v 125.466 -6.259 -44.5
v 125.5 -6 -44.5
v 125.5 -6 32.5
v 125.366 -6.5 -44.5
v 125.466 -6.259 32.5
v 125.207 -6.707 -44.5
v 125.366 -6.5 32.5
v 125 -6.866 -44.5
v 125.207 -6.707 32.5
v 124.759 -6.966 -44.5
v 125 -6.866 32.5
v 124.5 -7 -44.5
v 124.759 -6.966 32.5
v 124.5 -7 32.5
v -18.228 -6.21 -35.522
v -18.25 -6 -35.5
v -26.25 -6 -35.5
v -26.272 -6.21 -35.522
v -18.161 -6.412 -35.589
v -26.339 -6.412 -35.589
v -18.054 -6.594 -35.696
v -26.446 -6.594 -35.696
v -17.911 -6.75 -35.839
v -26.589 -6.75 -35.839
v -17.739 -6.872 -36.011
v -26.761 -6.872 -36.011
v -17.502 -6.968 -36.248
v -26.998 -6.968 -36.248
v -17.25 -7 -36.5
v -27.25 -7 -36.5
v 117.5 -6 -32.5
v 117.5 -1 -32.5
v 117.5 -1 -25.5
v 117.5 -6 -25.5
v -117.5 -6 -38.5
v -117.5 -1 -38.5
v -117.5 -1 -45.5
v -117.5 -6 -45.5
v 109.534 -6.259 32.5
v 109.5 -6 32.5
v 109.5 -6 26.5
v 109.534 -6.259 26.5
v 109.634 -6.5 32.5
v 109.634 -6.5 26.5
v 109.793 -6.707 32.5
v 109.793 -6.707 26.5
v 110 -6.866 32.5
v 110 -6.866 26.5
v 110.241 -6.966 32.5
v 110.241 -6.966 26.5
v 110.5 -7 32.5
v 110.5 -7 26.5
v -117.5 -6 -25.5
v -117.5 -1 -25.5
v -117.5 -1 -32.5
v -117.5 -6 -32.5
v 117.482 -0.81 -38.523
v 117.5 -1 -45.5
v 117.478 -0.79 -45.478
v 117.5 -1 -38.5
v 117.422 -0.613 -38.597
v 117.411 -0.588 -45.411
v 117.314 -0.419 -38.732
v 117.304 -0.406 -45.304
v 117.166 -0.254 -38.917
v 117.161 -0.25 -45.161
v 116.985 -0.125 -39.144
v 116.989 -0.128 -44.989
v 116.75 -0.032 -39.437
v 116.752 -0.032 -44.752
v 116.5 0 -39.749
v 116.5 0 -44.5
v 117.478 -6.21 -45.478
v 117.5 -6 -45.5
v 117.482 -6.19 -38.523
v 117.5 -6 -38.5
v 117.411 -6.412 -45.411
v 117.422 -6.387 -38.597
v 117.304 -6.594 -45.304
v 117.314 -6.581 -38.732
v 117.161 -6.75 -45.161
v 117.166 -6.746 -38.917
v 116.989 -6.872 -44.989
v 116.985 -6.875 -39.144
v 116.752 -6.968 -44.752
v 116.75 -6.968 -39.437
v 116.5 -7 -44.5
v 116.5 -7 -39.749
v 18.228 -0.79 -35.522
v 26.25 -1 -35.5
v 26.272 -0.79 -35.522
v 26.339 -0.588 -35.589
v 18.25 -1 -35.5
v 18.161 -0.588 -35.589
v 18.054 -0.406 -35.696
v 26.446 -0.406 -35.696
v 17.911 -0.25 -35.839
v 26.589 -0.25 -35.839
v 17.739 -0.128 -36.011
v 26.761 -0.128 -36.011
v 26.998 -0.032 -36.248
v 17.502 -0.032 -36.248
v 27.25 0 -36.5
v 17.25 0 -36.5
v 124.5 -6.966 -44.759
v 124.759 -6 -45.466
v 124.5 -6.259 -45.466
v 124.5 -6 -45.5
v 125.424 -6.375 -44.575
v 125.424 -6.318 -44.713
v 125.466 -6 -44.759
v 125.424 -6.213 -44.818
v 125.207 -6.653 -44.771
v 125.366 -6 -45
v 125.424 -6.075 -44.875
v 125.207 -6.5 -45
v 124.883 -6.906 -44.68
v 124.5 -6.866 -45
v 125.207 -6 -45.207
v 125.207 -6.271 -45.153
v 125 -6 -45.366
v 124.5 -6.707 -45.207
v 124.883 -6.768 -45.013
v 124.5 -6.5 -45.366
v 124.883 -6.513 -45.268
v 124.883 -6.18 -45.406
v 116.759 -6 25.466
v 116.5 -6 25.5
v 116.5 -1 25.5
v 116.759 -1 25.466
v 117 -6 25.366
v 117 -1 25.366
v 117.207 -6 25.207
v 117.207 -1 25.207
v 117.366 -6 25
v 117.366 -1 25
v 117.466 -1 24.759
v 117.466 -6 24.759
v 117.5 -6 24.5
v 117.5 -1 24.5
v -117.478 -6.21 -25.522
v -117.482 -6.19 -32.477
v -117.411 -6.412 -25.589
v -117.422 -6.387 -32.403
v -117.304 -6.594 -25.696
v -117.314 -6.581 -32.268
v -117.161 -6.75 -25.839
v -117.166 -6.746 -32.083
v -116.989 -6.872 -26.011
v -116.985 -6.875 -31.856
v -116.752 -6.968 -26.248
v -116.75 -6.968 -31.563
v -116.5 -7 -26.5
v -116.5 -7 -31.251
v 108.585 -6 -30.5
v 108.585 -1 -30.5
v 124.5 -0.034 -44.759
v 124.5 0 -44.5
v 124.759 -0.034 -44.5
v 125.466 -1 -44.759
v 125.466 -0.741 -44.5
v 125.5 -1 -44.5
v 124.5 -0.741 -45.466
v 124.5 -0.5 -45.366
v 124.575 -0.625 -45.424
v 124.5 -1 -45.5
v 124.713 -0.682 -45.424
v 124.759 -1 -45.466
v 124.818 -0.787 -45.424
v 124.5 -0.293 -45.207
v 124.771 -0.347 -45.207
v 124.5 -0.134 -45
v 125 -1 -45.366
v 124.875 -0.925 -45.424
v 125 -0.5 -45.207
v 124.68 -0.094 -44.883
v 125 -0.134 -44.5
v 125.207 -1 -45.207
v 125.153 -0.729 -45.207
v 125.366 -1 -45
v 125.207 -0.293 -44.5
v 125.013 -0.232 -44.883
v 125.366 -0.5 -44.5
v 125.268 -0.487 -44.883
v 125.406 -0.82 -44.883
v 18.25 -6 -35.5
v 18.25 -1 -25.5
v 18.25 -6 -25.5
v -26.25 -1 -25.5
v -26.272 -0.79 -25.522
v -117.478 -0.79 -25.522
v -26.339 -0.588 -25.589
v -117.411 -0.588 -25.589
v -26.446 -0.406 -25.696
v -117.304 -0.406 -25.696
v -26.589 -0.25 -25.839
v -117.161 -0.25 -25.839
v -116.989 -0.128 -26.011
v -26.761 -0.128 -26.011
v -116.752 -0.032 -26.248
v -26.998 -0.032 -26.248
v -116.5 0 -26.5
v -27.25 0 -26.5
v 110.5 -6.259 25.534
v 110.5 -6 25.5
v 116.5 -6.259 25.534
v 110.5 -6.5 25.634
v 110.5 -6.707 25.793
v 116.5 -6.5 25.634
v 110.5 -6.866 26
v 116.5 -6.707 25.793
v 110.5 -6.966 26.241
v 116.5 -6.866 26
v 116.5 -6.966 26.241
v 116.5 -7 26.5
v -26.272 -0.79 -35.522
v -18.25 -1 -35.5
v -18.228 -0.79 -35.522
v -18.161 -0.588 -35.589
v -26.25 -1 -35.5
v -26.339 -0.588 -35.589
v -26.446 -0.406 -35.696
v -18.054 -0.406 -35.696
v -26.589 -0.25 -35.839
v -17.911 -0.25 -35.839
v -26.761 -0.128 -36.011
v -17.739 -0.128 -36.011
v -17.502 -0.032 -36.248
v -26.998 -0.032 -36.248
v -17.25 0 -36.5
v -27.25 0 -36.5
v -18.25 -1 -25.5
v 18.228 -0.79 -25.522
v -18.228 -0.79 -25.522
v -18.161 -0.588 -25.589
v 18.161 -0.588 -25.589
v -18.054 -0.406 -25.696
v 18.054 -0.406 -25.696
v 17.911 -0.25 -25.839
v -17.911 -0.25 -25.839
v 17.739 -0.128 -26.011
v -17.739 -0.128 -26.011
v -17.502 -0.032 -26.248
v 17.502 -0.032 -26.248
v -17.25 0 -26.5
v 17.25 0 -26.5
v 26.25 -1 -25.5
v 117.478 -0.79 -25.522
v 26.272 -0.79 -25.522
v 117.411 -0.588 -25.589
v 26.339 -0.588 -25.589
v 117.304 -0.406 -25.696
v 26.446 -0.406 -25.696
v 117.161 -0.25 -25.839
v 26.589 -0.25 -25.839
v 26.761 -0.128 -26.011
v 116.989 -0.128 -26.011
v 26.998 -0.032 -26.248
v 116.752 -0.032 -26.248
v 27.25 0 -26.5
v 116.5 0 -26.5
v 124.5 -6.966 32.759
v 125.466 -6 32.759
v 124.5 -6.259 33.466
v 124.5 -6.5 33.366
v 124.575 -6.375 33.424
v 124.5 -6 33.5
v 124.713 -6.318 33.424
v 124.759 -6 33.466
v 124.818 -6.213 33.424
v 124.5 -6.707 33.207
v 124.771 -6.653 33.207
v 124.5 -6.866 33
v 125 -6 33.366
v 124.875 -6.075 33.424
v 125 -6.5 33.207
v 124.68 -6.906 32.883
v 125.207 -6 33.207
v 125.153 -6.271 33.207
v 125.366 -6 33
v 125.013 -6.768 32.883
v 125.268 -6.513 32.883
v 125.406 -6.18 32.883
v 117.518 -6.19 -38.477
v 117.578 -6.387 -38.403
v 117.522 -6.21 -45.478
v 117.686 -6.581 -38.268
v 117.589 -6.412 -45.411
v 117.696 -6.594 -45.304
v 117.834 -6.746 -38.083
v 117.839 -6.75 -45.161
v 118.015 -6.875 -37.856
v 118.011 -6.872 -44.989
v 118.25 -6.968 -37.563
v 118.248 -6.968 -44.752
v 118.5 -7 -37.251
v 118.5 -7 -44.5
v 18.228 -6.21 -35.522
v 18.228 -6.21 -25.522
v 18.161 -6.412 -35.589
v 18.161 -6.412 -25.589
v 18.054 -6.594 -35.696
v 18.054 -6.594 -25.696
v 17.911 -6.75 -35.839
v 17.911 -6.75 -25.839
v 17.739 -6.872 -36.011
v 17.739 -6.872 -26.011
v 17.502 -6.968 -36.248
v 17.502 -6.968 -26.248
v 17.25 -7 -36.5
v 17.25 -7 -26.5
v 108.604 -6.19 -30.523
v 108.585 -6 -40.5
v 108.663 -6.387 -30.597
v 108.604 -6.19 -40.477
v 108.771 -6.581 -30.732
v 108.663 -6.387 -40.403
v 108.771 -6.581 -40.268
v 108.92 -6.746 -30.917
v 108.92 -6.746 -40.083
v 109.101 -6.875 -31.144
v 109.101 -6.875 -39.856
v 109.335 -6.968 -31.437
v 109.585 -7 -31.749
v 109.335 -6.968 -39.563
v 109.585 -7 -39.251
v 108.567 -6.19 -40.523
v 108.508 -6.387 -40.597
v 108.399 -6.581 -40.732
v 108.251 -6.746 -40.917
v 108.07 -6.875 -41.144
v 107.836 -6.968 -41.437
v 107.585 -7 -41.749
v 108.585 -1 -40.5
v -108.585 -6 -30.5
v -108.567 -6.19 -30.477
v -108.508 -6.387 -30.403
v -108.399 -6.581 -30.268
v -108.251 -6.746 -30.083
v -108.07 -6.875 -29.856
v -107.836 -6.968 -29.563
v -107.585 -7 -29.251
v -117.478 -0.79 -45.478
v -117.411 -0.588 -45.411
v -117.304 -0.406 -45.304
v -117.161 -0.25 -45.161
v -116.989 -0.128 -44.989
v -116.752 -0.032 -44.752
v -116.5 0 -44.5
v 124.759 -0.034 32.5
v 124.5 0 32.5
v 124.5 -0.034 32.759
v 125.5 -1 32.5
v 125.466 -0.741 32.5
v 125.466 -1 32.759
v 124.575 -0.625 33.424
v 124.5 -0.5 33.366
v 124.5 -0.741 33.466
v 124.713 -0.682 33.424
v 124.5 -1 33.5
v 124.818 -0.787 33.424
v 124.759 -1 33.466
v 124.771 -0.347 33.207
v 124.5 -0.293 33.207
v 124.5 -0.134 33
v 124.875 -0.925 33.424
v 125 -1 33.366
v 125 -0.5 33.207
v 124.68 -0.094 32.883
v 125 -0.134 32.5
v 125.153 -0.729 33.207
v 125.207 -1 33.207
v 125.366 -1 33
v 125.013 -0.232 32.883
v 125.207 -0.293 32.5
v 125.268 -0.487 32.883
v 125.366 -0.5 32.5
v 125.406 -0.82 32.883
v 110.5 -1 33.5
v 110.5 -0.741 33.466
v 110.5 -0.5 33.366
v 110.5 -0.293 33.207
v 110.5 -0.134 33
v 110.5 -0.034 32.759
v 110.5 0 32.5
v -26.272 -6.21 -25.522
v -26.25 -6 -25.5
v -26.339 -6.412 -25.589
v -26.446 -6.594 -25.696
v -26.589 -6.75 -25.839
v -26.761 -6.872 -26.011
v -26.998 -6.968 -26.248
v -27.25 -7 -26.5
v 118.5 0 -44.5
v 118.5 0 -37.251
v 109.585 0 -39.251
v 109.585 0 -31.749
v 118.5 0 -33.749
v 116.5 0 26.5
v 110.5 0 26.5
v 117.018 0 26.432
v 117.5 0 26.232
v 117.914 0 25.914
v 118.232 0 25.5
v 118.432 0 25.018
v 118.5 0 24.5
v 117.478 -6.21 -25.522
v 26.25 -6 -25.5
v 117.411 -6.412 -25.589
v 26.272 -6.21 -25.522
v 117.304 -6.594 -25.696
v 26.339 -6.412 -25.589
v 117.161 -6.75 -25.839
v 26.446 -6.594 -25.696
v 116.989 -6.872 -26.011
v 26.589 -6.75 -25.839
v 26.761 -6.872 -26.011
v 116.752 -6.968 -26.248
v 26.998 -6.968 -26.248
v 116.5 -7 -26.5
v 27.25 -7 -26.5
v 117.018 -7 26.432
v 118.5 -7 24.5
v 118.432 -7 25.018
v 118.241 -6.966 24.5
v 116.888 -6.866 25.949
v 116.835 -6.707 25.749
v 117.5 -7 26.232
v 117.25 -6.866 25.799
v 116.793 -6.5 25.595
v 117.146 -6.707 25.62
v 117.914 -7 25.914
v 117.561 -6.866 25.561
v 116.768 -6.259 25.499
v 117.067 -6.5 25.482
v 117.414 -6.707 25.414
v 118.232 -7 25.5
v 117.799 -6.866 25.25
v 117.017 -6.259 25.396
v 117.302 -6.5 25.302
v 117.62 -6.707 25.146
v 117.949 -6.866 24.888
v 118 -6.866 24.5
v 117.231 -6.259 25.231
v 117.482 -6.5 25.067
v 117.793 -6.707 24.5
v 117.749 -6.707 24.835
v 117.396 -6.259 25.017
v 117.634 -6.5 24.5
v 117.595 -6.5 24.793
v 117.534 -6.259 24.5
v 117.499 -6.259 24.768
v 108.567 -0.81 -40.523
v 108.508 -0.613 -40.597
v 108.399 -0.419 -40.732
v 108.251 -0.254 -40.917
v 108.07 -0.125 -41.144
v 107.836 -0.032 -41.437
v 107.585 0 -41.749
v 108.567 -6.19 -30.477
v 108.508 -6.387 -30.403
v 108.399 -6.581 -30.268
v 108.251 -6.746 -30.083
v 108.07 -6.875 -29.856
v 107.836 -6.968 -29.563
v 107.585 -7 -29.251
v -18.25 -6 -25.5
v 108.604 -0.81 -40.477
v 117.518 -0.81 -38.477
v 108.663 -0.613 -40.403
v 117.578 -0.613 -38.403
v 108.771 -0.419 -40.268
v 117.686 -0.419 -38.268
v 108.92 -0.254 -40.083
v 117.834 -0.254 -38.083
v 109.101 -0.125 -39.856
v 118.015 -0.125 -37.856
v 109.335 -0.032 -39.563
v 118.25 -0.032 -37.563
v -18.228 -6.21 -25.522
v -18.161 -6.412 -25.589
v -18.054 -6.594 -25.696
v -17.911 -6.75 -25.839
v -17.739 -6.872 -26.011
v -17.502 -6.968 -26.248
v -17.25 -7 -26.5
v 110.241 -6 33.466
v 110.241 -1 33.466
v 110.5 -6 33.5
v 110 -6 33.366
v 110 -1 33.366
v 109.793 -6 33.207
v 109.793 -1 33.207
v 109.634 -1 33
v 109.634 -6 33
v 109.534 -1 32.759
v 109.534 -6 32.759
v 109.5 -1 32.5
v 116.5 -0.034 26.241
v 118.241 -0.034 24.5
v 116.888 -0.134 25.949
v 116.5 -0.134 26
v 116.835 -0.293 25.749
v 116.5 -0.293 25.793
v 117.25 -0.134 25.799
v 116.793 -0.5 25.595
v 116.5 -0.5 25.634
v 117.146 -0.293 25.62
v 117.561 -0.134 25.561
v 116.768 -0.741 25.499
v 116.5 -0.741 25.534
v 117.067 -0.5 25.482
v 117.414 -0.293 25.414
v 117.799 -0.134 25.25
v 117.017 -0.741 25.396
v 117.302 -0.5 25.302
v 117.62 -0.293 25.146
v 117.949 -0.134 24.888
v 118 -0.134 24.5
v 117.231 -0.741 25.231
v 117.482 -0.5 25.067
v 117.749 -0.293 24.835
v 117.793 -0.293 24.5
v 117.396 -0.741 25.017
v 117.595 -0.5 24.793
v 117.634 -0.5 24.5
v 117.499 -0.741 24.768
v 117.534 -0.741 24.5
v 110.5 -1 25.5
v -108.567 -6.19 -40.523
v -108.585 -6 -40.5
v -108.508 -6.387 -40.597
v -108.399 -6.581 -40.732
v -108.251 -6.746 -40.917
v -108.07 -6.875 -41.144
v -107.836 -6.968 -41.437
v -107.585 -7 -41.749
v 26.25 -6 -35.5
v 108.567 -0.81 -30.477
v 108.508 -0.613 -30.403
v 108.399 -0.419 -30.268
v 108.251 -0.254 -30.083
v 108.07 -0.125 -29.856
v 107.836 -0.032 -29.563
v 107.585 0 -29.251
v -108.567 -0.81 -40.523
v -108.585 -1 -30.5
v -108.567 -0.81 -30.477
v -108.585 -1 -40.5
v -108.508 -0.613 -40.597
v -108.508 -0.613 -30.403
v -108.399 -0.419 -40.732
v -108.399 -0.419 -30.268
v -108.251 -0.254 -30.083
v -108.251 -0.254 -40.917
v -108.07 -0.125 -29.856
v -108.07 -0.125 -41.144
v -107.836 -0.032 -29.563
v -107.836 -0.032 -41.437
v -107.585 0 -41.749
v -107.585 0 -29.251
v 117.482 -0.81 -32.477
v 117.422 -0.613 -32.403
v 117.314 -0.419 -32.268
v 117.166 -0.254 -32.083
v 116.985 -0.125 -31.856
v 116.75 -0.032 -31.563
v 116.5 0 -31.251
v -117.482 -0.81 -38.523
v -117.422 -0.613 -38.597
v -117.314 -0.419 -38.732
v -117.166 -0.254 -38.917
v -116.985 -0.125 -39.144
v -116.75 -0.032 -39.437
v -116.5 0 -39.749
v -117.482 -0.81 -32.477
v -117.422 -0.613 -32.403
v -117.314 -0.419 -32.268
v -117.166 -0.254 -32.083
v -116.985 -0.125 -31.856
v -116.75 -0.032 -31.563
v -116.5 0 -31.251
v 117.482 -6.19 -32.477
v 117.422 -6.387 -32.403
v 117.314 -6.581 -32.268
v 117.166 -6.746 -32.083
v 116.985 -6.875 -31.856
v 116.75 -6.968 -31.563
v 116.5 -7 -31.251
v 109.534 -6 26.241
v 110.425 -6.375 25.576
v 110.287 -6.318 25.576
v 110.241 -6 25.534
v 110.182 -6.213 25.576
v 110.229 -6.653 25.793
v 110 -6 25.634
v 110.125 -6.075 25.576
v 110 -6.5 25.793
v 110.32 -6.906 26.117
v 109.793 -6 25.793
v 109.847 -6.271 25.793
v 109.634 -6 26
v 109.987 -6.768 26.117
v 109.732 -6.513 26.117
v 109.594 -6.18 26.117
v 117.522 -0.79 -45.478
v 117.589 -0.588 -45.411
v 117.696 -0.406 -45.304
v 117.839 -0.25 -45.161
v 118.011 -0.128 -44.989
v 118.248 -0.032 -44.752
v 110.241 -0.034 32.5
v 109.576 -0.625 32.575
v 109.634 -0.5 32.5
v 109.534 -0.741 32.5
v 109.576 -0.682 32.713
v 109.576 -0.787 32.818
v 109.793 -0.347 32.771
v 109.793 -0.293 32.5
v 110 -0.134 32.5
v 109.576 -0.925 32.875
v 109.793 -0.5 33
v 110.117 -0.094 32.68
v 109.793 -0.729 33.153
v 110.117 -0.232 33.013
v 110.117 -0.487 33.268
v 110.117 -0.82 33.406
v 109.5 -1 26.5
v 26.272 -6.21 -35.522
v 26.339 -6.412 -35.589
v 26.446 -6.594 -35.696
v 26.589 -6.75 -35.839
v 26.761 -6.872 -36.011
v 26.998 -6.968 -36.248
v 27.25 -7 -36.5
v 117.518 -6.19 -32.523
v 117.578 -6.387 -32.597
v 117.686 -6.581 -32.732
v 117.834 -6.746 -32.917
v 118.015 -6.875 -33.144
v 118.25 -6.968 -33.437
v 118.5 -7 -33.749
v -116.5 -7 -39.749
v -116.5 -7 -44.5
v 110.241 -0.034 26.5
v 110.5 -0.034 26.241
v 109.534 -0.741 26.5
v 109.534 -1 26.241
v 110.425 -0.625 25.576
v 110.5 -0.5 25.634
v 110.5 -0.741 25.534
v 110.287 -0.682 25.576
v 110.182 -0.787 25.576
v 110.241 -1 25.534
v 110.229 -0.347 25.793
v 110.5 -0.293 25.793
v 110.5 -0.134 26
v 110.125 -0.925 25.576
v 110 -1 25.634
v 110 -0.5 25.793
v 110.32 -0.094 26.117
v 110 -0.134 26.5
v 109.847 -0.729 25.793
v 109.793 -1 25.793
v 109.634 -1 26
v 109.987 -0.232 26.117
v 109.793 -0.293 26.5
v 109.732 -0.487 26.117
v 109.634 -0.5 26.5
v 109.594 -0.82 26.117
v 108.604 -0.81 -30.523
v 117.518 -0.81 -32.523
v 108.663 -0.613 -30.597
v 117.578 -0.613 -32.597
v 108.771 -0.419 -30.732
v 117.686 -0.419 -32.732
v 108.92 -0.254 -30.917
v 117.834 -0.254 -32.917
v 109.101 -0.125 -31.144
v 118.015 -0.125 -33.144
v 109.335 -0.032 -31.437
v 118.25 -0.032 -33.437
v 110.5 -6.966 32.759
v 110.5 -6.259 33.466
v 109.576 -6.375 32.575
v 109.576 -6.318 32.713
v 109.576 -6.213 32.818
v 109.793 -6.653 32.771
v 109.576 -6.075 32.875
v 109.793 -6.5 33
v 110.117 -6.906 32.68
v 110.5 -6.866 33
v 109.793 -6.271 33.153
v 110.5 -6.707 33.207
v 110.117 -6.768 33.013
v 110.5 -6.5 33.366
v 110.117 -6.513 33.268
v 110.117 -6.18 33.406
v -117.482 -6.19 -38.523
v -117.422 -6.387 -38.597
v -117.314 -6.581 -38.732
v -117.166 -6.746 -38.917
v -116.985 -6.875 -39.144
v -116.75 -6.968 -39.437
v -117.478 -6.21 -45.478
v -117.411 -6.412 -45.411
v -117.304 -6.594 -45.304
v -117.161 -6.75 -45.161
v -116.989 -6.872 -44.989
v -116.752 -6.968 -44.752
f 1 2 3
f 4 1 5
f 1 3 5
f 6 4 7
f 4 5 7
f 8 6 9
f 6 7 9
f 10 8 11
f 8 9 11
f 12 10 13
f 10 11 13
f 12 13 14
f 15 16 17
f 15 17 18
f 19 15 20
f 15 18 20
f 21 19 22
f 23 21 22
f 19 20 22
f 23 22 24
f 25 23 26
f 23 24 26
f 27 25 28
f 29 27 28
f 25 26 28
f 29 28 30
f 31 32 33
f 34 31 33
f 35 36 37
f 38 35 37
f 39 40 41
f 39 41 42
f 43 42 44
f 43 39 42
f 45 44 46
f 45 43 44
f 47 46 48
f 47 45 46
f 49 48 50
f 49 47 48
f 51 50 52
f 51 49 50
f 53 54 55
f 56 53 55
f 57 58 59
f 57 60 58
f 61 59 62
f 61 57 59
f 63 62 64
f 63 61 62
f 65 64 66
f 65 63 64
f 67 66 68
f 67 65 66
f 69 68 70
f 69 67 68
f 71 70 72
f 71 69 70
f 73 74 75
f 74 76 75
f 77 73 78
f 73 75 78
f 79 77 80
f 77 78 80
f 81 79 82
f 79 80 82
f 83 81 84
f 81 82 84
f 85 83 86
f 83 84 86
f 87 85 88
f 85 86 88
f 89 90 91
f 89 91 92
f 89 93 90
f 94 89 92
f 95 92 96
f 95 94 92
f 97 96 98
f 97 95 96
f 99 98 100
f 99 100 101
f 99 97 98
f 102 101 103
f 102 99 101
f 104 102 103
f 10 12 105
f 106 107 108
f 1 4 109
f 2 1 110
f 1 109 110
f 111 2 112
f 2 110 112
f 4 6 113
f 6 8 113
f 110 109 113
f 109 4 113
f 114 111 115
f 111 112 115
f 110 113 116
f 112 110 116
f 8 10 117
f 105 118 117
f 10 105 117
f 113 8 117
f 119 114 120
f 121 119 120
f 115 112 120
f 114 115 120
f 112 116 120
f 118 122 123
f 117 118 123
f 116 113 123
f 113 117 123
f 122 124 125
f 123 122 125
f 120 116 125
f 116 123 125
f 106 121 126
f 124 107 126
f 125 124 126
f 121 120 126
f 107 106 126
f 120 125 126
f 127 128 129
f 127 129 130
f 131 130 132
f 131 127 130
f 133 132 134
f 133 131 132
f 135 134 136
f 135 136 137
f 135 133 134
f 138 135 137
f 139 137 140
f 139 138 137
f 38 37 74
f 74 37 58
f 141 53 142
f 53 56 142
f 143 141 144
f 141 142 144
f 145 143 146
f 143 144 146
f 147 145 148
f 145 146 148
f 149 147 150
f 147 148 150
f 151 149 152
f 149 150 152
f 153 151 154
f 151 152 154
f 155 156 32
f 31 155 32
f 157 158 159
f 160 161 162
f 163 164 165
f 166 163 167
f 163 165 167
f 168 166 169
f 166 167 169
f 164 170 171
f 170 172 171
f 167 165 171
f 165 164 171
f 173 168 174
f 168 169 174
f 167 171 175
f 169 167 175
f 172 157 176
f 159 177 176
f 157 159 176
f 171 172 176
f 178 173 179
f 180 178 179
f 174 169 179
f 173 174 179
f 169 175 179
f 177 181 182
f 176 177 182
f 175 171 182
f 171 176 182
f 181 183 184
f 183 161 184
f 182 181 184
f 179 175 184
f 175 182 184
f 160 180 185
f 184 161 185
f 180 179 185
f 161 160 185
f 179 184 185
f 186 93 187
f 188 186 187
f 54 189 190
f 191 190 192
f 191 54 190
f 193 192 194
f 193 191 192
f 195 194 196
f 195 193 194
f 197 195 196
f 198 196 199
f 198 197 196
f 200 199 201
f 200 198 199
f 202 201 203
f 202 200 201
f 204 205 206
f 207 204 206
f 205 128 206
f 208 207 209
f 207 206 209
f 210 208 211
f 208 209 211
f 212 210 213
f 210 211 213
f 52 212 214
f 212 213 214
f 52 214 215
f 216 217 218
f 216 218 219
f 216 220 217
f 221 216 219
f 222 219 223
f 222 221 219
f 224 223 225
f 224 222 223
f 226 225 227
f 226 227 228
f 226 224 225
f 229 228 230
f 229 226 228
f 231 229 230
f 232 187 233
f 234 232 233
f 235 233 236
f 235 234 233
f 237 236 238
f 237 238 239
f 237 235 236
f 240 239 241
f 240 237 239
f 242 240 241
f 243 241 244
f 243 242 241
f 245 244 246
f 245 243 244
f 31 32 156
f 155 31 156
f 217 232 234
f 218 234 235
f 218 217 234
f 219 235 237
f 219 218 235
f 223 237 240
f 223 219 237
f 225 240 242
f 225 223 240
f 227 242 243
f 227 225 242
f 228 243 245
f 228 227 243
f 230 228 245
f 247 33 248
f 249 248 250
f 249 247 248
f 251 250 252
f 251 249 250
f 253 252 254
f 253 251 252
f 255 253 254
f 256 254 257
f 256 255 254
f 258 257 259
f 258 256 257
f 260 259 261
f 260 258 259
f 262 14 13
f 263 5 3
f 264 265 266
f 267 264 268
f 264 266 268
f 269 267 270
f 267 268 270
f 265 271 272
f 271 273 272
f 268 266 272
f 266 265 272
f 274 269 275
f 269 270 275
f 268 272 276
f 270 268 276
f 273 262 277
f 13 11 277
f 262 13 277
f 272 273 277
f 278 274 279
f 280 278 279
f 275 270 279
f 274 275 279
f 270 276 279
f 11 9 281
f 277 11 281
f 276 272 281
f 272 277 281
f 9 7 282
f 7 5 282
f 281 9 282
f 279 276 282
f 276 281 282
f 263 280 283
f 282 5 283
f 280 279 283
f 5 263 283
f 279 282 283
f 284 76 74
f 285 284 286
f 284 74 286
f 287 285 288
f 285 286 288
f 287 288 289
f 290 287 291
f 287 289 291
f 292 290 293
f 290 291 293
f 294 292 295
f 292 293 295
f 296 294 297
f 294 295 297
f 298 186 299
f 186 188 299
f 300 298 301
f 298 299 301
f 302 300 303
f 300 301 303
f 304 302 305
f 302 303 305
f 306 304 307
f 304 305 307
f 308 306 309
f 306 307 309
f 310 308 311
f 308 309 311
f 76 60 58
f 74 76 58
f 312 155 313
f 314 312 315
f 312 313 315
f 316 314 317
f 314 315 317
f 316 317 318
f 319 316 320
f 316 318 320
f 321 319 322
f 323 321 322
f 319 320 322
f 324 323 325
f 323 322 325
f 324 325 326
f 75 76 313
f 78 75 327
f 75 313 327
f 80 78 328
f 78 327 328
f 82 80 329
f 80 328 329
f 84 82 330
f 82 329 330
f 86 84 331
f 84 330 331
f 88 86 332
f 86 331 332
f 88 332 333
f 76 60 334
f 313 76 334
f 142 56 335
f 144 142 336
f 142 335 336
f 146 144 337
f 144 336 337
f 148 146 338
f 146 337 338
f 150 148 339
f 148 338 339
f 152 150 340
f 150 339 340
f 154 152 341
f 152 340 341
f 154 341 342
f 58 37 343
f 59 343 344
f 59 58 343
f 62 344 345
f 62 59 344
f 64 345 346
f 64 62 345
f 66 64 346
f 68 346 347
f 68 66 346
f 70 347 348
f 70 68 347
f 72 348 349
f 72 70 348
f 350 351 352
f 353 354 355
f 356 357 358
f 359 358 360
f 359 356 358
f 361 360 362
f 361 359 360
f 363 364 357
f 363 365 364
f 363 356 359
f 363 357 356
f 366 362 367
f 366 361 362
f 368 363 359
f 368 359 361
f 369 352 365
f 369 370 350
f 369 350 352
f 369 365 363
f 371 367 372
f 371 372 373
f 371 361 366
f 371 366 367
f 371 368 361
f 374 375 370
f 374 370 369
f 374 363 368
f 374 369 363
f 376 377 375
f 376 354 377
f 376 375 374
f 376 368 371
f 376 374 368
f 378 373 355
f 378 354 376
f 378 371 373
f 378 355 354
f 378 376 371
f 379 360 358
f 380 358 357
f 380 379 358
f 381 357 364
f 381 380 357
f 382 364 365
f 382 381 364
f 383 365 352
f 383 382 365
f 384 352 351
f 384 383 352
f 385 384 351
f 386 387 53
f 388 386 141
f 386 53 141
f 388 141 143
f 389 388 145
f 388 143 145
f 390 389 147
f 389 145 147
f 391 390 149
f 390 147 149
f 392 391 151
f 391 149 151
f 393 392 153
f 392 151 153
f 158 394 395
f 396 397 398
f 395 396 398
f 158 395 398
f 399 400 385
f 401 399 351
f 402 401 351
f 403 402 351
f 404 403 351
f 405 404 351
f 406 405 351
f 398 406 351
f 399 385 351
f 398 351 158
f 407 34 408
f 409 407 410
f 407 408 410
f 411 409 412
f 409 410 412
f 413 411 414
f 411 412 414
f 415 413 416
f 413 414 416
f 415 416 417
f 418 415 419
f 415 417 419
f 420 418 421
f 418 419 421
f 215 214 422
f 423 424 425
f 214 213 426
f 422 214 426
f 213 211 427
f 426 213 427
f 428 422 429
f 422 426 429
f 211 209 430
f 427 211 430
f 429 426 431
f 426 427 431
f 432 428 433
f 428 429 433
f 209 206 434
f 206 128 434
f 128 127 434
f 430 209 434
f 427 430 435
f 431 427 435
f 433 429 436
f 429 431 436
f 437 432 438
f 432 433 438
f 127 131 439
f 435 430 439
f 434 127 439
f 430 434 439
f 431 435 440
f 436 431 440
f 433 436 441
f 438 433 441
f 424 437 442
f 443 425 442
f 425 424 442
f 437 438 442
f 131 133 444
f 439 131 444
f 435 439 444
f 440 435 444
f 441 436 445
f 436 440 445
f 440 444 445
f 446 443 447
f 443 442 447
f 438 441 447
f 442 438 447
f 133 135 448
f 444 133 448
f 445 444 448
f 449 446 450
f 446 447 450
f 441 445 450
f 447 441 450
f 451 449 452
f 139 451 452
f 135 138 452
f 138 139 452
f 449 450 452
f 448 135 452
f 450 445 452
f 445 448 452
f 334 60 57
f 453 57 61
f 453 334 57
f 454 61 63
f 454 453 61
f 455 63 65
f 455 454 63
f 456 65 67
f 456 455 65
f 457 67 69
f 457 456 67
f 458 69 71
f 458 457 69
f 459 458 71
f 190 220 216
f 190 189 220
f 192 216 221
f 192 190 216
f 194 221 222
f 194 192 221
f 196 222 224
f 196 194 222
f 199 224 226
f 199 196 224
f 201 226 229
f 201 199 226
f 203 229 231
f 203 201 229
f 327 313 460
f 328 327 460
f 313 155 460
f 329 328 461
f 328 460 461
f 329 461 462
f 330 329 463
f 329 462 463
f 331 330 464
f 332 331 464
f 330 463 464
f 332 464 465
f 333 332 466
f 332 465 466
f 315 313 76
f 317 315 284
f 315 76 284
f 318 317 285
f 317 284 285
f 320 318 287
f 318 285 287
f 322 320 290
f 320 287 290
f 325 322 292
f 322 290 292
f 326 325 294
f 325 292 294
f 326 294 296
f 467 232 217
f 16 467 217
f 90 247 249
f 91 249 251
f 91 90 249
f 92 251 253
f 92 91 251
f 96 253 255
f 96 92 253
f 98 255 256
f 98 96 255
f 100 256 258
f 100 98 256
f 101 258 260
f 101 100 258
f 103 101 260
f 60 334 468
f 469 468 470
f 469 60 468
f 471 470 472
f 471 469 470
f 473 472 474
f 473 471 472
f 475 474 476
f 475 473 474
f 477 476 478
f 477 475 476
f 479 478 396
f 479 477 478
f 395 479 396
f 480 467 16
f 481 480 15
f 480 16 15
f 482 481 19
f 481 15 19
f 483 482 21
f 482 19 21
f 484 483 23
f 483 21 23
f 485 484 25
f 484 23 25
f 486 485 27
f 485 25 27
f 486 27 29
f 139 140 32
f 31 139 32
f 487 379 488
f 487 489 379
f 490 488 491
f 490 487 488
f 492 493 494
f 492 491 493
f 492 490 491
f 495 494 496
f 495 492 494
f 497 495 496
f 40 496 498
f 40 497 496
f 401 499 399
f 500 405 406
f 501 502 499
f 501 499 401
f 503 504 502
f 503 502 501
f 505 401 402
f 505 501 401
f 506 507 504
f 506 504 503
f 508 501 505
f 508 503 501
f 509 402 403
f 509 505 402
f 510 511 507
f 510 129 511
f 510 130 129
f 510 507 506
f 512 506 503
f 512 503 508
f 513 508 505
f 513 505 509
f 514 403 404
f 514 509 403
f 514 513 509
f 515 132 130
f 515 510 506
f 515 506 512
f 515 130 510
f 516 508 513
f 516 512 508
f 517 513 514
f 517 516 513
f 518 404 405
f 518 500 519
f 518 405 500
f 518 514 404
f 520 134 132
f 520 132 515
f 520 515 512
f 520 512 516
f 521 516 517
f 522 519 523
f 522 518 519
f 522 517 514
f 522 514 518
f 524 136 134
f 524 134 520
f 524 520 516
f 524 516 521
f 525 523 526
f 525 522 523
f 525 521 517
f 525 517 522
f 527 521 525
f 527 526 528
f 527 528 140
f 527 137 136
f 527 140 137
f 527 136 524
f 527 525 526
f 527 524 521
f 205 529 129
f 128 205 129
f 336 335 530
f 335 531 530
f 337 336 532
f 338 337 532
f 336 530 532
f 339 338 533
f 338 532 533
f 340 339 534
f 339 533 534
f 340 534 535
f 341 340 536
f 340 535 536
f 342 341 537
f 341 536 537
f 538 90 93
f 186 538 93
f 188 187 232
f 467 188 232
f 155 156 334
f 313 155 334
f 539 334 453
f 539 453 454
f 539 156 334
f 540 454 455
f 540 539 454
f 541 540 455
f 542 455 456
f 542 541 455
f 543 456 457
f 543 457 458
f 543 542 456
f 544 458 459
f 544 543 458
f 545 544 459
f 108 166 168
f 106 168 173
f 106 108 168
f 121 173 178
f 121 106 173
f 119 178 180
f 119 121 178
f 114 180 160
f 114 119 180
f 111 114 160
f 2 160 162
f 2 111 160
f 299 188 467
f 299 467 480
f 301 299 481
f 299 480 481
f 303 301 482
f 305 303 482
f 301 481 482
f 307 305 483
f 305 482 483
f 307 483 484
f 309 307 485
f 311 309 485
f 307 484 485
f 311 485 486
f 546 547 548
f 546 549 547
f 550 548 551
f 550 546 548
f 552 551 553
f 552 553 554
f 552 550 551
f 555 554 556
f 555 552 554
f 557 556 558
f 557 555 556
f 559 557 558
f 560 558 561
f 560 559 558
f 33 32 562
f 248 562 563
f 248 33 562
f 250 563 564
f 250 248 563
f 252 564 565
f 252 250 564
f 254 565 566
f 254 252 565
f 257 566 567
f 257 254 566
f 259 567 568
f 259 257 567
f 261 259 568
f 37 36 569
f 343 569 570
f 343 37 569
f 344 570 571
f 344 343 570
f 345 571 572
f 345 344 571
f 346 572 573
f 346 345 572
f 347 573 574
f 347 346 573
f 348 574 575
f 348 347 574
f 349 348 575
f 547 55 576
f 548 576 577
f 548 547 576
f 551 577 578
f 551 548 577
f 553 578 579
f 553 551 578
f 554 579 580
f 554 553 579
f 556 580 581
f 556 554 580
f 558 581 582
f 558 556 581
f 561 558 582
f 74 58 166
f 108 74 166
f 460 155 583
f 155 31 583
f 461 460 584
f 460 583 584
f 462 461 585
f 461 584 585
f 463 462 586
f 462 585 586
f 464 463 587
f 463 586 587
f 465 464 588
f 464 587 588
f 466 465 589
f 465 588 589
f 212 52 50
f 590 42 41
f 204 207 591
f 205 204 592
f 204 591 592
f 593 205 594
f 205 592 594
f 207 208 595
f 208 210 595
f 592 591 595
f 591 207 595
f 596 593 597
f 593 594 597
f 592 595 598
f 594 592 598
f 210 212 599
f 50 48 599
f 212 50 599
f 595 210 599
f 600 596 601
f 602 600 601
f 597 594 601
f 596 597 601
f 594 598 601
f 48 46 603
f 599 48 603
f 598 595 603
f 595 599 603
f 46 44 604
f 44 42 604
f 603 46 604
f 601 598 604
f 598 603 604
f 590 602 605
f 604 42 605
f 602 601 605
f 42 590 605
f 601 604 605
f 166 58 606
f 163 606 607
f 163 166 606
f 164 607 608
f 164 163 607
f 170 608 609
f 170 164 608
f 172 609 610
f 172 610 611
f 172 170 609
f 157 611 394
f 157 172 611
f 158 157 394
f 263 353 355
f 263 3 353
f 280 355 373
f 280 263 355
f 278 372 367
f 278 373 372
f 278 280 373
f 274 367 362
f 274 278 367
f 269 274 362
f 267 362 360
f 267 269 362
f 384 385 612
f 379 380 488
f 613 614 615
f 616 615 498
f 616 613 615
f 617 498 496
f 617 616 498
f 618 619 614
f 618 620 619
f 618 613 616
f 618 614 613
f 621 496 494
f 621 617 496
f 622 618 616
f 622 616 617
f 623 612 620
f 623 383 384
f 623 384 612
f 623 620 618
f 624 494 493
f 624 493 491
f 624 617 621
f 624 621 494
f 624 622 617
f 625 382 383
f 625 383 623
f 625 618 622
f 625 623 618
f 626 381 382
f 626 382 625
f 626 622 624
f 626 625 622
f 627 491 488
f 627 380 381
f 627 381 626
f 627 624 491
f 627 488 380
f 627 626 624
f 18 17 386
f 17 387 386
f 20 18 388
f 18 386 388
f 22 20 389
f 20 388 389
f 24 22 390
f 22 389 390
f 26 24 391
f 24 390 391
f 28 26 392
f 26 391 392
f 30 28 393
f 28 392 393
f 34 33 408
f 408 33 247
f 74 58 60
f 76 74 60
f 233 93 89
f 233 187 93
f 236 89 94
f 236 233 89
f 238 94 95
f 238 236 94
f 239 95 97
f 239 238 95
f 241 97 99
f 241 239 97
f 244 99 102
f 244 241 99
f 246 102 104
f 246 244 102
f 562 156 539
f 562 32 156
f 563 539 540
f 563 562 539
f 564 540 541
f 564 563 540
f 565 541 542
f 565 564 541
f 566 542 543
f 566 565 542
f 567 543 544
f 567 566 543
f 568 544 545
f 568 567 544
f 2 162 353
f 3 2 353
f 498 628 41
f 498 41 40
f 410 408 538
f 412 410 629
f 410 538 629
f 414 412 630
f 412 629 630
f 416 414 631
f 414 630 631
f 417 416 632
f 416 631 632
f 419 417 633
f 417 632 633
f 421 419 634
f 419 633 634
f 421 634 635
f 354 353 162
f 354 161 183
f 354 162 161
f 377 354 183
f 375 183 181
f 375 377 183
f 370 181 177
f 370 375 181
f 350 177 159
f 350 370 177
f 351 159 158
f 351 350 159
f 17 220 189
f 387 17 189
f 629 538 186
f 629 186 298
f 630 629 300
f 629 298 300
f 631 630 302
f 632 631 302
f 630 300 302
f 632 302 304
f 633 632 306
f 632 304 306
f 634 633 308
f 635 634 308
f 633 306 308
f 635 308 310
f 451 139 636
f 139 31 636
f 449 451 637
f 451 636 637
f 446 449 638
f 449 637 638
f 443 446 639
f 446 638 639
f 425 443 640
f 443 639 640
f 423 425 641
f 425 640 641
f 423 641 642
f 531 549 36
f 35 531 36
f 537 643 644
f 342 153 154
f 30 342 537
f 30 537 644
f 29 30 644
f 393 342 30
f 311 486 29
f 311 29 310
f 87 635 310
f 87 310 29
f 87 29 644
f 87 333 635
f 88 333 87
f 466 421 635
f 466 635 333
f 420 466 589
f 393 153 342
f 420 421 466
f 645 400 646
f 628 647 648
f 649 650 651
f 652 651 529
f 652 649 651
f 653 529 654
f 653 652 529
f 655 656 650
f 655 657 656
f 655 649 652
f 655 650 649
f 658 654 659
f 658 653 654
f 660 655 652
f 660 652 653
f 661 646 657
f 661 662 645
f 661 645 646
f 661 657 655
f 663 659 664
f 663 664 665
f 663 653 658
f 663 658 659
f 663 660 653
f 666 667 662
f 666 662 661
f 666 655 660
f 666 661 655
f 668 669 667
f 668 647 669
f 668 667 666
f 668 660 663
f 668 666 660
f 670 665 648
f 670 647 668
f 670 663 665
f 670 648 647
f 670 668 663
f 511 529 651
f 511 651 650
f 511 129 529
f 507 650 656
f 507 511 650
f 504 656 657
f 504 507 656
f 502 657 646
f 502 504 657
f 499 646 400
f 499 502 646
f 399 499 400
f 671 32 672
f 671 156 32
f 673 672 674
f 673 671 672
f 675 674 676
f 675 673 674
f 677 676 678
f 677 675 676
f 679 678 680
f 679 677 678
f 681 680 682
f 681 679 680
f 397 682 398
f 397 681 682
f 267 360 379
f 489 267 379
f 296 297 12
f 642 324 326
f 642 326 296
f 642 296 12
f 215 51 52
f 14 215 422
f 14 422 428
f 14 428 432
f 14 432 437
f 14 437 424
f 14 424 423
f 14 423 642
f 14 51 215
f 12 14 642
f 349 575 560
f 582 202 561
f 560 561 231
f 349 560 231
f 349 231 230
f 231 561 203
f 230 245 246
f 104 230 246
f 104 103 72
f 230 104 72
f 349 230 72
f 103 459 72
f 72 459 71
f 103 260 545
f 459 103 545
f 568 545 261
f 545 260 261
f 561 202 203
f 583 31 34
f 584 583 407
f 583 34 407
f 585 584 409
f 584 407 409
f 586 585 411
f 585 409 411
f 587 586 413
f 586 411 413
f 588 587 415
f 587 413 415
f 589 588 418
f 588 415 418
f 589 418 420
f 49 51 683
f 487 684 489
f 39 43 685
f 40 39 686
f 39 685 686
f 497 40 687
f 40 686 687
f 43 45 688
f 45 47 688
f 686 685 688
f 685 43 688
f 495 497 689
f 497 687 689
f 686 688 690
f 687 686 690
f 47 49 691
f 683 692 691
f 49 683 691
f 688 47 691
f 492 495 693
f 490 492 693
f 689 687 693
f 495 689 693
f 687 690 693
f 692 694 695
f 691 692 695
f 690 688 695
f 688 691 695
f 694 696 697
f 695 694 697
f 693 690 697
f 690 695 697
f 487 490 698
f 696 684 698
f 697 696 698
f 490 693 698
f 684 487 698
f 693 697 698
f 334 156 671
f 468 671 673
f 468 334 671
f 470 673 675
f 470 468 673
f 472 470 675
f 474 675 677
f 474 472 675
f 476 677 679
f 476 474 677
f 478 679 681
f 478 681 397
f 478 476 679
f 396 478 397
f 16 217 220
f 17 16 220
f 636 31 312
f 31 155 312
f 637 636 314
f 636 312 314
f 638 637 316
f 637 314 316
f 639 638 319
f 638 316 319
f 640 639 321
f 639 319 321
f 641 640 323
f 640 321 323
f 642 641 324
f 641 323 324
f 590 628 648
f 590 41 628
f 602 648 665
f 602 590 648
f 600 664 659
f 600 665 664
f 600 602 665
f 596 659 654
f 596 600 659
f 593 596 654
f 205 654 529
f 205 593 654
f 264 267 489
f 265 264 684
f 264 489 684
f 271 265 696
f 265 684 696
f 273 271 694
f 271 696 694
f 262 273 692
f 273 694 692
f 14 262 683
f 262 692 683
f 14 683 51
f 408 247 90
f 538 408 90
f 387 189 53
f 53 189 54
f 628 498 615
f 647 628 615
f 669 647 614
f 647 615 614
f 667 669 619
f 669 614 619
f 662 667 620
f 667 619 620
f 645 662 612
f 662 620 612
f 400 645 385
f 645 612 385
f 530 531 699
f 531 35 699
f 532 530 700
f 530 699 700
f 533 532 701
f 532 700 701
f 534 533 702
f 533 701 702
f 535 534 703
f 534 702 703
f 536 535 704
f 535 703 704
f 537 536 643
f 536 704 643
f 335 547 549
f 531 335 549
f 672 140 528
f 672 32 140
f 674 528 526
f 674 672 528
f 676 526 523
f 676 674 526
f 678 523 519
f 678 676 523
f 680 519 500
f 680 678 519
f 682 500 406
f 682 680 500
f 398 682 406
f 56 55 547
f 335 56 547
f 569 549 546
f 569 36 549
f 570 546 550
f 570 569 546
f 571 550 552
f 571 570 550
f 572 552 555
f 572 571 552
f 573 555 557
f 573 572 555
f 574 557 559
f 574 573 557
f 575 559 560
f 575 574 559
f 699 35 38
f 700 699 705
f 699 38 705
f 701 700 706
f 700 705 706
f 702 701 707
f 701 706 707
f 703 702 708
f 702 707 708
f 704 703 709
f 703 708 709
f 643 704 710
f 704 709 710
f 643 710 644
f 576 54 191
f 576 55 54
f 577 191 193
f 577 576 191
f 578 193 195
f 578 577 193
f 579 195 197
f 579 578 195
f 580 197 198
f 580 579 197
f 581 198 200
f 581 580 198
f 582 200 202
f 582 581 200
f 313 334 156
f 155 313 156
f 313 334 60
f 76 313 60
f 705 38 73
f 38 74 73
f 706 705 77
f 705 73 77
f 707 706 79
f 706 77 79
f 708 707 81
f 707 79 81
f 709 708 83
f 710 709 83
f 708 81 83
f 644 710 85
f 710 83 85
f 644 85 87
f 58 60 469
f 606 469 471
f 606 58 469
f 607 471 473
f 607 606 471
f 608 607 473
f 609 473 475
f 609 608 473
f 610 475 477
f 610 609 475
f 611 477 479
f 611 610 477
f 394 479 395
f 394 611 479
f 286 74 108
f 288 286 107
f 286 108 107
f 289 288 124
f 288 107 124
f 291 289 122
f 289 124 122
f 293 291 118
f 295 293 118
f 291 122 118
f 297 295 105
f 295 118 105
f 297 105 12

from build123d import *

# Parameters (mm, degrees)
F1_DEPTH = 7
F2_R     = 1
F0_W     = 8
F0_H     = 8
F3_DEPTH = 7
F4_R     = 1


with BuildPart() as f1:
    # F0 (on Front) → F1 (new body)
    with BuildSketch(Plane.XZ):
        Polygon((-26.25, -25.5), (-117.5, -25.5), (-117.5, -32.5), (-108.5853725672, -30.5), (-108.5853725672, -40.5), (-117.5, -38.5), (-117.5, -45.5), (117.5, -45.5), (117.5, -38.5), (108.5853725672, -40.5), (108.5853725672, -30.5), (117.5, -32.5), (117.5, -25.5), (26.25, -25.5), (26.25, -35.5), (18.25, -35.5), (18.25, -25.5), (-18.25, -25.5), (-18.25, -35.5), (-26.25, -35.5), align=None)
    extrude(amount=F1_DEPTH)

    # F2
    f2_edges = [f1.edges().sort_by_distance(p)[0] for p in [
        (0, 0, -45.5),
        (71.875, 0, -25.5),
        (26.25, 0, -30.5),
        (22.25, 0, -35.5),
        (18.25, 0, -30.5),
        (0, 0, -25.5),
        (-18.25, 0, -30.5),
        (-22.25, 0, -35.5),
        (-26.25, 0, -30.5),
        (-71.875, 0, -25.5),
        (-117.5, 0, -29),
        (-113.042686, 0, -31.5),
        (-108.585373, 0, -35.5),
        (-113.042686, 0, -39.5),
        (-117.5, 0, -42),
        (117.5, 0, -42),
        (113.042686, 0, -39.5),
        (108.585373, 0, -35.5),
        (113.042686, 0, -31.5),
        (117.5, 0, -29),
        (-71.875, -7, -25.5),
        (-117.5, -7, -29),
        (-113.042686, -7, -31.5),
        (-108.585373, -7, -35.5),
        (-113.042686, -7, -39.5),
        (-117.5, -7, -42),
        (0, -7, -45.5),
        (117.5, -7, -42),
        (113.042686, -7, -39.5),
        (108.585373, -7, -35.5),
        (113.042686, -7, -31.5),
        (117.5, -7, -29),
        (71.875, -7, -25.5),
        (26.25, -7, -30.5),
        (22.25, -7, -35.5),
        (18.25, -7, -30.5),
        (0, -7, -25.5),
        (-18.25, -7, -30.5),
        (-22.25, -7, -35.5),
        (-26.25, -7, -30.5),
    ]]
    fillet(f2_edges, radius=F2_R)


with BuildPart() as f3:
    # F0 (on Front) → F3 (new body)
    with BuildSketch(Plane.XZ):
        Polygon((117.5, -38.5), (117.5, -45.5), (125.5, -45.5), (125.5, 33.5), (117.5, 33.5), (117.5, 25.5), (117.5, -25.5), (117.5, -32.5), align=None)
        Polygon((108.5853725672, -40.5), (117.5, -38.5), (117.5, -32.5), (108.5853725672, -30.5), align=None)
        with Locations((113.5, 29.5)):
            Rectangle(F0_W, F0_H)
    extrude(amount=F3_DEPTH)

    # F4
    f4_edges = [f3.edges().sort_by_distance(p)[0] for p in [
        (125.5, 0, -6),
        (117.5, 0, -42),
        (121.5, 0, -45.5),
        (117.5, 0, 33.5),
        (109.5, 0, 29.5),
        (113.5, 0, 25.5),
        (117.5, 0, -3.5),
        (113.042686, 0, -31.5),
        (108.585373, 0, -35.5),
        (113.042686, 0, -39.5),
        (117.5, -7, -42),
        (121.5, -7, -45.5),
        (125.5, -7, -6),
        (117.5, -7, 33.5),
        (109.5, -7, 29.5),
        (113.5, -7, 25.5),
        (117.5, -7, -3.5),
        (113.042686, -7, -31.5),
        (108.585373, -7, -35.5),
        (113.042686, -7, -39.5),
        (125.5, -3.5, 33.5),
        (109.5, -3.5, 33.5),
        (125.5, -3.5, -45.5),
        (109.5, -3.5, 25.5),
        (117.5, -3.5, 25.5),
    ]]
    fillet(f4_edges, radius=F4_R)


solid = Compound([f1.part, f3.part])
